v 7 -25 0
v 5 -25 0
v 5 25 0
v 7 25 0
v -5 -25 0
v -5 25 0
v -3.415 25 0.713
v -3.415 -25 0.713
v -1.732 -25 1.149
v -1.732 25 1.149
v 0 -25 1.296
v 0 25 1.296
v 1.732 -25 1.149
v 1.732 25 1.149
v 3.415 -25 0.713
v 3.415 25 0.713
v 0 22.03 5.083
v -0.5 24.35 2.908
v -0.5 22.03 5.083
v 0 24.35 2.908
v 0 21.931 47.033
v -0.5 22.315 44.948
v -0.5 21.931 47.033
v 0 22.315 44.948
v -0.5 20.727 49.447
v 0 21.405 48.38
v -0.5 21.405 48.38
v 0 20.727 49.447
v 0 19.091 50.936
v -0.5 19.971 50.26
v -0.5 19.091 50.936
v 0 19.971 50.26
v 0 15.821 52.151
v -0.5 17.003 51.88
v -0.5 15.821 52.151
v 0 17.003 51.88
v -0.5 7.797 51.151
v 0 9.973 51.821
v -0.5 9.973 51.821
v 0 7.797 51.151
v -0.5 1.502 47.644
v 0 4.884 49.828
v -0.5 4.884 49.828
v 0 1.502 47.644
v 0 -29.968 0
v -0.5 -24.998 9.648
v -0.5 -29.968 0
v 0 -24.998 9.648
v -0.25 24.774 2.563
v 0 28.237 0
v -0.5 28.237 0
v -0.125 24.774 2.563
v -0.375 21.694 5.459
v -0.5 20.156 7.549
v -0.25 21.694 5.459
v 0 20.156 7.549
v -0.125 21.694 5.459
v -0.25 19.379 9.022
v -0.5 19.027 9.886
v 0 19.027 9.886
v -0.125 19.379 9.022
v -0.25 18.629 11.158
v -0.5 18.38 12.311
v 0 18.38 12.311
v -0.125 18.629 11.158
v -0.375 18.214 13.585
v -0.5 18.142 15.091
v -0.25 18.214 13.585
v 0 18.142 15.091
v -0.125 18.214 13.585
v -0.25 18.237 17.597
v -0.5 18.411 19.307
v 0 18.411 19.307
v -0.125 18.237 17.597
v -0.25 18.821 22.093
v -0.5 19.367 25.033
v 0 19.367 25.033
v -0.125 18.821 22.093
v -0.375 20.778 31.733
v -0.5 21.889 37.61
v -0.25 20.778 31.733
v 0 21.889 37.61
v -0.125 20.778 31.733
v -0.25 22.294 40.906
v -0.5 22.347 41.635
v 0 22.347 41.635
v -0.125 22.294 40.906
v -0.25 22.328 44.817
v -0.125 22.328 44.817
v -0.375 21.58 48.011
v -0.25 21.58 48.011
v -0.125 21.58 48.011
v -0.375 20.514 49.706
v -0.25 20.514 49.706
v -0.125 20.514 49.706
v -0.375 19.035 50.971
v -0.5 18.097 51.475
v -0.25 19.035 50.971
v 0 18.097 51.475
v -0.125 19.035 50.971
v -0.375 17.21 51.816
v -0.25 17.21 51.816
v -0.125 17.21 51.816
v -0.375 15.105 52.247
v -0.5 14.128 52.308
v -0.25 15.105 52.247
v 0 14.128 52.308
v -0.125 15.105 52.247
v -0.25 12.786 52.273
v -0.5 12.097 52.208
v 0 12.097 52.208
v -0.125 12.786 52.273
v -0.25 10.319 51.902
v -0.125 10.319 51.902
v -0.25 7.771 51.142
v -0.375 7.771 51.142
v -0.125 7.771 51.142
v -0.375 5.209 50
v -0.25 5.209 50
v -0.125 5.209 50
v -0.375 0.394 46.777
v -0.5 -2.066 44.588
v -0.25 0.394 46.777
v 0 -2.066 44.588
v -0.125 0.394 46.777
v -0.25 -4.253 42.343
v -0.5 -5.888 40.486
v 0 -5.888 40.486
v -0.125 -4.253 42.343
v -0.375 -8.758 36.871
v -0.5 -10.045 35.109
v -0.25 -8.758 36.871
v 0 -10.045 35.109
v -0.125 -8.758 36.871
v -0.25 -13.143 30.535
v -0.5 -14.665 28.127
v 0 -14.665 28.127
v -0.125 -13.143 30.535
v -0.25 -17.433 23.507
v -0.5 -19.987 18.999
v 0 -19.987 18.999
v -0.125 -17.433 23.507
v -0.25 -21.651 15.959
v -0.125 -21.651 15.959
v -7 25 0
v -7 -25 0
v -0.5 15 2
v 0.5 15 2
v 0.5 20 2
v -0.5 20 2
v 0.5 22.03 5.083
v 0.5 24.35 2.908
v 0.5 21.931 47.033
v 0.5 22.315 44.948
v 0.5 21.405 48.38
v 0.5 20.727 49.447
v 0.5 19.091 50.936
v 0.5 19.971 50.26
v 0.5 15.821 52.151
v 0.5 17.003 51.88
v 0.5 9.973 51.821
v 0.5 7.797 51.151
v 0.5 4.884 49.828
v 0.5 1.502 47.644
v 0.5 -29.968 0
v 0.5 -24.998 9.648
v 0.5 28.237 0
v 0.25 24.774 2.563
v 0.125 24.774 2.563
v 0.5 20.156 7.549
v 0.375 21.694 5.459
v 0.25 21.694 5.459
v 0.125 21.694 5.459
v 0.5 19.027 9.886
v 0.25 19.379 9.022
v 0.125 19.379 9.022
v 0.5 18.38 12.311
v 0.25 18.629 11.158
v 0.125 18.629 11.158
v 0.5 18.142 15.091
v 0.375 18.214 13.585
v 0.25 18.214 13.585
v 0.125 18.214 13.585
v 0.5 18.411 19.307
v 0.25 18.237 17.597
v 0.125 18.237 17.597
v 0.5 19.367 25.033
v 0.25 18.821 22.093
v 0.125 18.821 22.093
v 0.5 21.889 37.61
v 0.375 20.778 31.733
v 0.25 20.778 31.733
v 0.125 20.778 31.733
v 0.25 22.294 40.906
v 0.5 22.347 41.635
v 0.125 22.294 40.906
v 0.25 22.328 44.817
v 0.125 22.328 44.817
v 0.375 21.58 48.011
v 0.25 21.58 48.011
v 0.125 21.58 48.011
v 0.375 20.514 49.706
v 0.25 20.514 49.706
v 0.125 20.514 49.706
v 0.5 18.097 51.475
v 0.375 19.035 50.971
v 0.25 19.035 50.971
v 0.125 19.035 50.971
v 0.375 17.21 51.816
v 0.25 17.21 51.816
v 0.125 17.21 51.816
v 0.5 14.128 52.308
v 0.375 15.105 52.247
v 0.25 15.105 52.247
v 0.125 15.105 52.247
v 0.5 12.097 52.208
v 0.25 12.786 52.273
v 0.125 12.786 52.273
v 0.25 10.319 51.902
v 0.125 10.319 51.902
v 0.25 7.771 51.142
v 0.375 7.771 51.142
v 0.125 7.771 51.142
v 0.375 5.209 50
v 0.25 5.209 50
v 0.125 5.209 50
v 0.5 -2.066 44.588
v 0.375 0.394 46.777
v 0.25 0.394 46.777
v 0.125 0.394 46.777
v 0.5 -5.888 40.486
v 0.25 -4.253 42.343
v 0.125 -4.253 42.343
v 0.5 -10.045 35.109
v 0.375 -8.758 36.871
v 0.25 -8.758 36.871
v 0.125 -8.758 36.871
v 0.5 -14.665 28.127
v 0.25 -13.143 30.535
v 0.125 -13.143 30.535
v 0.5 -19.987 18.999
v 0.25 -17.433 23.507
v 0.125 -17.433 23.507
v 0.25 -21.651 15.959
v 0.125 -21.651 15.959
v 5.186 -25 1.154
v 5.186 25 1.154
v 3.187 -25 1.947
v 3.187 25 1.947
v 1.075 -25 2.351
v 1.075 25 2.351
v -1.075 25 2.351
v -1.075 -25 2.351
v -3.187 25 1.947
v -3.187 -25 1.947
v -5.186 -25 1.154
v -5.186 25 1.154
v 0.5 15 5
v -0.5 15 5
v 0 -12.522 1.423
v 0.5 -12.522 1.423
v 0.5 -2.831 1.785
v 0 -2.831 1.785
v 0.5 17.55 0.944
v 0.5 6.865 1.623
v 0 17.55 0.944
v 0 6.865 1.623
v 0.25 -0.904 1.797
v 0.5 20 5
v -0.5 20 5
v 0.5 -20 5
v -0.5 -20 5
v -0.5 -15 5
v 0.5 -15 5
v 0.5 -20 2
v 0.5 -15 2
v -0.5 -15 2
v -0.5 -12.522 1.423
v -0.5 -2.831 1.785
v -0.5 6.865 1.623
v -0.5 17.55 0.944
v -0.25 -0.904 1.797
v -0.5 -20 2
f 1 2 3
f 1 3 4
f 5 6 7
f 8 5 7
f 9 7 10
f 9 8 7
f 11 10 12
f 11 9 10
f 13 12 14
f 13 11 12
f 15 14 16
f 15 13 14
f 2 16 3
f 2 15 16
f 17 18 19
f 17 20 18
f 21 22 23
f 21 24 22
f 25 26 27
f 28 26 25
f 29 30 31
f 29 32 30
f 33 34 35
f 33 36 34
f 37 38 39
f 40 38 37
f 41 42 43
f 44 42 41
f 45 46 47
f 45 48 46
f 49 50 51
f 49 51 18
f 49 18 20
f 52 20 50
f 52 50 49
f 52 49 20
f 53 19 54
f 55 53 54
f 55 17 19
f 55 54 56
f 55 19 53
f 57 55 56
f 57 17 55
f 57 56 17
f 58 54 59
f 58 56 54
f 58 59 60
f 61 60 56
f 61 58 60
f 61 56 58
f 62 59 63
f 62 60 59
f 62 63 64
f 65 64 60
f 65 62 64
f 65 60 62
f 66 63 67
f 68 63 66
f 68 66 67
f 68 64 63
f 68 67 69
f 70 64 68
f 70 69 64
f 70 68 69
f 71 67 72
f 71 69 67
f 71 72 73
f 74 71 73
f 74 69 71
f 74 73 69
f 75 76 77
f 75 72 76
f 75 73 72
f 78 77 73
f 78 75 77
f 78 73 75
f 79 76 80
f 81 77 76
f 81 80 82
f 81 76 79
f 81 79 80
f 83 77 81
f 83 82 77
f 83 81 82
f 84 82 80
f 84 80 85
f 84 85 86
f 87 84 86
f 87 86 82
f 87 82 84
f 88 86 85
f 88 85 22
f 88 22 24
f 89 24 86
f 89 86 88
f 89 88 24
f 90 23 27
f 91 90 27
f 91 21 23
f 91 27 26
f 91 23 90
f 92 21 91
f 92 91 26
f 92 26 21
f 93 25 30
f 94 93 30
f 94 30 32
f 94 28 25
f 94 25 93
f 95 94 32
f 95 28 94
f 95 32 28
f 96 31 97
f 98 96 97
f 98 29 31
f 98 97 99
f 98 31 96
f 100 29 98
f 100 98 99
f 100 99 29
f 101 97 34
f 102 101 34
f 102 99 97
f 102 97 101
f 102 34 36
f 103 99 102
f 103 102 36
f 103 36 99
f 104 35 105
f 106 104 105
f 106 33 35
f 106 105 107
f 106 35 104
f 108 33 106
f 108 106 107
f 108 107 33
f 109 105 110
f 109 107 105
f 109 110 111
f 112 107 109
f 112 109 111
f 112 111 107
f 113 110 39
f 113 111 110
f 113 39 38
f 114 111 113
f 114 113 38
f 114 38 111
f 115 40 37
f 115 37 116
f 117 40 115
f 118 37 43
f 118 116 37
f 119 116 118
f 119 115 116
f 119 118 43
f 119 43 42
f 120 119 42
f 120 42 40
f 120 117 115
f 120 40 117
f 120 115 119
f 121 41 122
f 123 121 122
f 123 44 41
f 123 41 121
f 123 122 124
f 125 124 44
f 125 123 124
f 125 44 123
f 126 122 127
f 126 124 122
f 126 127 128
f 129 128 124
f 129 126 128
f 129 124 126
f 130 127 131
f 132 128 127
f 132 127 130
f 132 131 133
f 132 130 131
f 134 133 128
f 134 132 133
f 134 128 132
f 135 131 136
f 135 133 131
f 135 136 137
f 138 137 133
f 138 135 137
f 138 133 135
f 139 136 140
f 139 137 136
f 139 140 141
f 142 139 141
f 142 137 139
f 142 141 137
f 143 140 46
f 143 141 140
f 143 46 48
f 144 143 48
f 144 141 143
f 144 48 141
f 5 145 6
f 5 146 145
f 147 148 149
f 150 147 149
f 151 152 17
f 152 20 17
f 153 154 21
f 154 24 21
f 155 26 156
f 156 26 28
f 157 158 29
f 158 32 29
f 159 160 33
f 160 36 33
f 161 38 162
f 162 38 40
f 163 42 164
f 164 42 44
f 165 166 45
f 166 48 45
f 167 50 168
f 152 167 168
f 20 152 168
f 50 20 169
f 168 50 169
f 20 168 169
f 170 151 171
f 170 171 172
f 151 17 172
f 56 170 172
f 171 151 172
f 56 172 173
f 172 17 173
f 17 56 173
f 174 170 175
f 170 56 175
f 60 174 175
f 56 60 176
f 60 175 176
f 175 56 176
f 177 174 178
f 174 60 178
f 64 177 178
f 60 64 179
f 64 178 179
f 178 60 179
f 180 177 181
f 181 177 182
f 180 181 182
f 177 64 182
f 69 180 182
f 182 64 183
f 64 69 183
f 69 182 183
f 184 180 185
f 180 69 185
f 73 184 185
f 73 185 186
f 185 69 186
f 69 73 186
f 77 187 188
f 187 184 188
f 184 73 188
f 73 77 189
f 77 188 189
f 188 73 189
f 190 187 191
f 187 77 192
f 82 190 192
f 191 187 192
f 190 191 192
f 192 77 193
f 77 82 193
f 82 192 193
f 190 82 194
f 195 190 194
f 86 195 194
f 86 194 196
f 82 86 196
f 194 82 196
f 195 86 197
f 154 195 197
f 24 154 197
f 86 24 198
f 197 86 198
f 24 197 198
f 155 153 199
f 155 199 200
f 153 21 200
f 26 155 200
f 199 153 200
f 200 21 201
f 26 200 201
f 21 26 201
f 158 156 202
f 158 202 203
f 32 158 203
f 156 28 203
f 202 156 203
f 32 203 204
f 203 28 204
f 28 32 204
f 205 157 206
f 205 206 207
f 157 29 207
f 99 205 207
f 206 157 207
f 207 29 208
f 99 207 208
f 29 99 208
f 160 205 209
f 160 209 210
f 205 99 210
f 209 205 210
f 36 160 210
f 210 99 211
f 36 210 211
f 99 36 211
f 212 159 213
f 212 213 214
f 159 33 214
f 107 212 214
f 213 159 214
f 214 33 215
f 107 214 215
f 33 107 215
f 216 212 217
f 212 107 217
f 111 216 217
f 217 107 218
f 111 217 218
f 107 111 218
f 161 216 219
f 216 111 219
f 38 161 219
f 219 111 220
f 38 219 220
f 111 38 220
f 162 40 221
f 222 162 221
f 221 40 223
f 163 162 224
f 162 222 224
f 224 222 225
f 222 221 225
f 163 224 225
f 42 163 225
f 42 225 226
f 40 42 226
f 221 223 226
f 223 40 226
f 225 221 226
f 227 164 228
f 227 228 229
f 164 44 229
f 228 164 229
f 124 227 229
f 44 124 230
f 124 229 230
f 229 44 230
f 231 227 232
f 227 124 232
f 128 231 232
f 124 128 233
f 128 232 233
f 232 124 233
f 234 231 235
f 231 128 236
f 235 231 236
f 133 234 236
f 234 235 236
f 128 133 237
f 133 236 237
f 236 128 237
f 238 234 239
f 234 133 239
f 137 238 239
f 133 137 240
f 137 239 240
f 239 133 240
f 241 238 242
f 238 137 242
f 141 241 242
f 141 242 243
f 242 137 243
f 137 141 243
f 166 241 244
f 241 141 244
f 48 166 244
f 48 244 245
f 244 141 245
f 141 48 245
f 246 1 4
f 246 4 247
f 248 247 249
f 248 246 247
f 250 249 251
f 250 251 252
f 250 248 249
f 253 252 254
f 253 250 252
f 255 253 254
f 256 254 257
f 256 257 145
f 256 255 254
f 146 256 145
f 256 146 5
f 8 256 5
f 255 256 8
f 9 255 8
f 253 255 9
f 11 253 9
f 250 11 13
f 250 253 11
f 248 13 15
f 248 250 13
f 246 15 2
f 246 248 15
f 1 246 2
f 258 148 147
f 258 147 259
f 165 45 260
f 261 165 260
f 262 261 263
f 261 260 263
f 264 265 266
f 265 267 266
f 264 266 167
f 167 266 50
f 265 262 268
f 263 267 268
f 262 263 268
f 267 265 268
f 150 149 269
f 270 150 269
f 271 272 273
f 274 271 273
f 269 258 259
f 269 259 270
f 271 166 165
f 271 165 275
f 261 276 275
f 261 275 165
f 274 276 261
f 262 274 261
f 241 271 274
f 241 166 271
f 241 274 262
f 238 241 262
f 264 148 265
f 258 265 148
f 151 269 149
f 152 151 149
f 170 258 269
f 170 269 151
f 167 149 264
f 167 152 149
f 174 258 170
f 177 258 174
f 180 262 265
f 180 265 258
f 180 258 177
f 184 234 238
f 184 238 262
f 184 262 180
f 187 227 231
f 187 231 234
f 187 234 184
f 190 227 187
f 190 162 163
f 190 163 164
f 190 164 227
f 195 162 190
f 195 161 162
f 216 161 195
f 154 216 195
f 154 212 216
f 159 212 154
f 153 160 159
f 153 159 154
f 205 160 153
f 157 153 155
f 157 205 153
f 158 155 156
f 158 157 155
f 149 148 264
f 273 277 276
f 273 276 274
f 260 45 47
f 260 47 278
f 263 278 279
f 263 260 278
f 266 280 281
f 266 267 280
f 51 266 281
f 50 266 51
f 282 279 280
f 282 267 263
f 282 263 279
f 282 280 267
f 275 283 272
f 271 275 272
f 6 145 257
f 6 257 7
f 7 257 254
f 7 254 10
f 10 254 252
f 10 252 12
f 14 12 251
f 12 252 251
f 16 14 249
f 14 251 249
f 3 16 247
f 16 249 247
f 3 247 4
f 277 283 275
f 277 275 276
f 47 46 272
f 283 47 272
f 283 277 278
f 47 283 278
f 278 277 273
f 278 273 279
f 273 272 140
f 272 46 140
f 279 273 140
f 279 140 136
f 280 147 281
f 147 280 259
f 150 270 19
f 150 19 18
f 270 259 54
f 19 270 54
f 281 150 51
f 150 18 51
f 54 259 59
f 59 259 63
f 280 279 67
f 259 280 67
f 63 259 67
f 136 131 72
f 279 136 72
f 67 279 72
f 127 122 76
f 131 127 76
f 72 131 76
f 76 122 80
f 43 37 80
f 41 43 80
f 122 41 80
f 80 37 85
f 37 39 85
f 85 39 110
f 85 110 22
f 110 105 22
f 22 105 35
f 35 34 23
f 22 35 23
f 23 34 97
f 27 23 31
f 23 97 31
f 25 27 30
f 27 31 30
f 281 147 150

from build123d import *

# Parameters (mm, degrees)
F2_DEPTH = 25
F3_DEPTH = 0.5
F4_W     = 5
F4_H     = 3
F5_DEPTH = 1


with BuildPart() as f2:
    # F0 (on Front) → F2 (new body, symmetric)
    with BuildSketch(Plane.XZ):
        with BuildLine():
            ThreePointArc((-5, 0), (0, 1.295630141), (5, 0))
            Line((5, 0), (7, 0))
            ThreePointArc((7, 0), (0, 2.401754251), (-7, 0))
            Line((-7, 0), (-5, 0))
        make_face()
    extrude(amount=F2_DEPTH, both=True)


with BuildPart() as f3:
    # F1 (on Right) → F3 (new body, symmetric)
    with BuildSketch(Plane.YZ):
        with BuildLine():
            add(Edge.make_bspline(
                [(-29.968450375, 0), (-20.2834898441, 0.8980619755), (-0.9008219888, 2.6953679045), (18.52041614, 0.8988497881), (28.2374212838, 0)],
                knots=[0, 0, 0, 0, 0.4996711806, 1, 1, 1, 1], degree=3))
            add(Edge.make_bspline(
                [(28.2374212838, 0), (23.5346273127, 3.3426593215), (12.1004134849, 11.4698878734), (29.9820999442, 52.4786254251), (-2.1355902035, 54.384946251), (-18.9209685078, 21.5865959824), (-29.968450375, 0)],
                knots=[0, 0, 0, 0, 0.1878770554, 0.456797903, 0.6424855486, 1, 1, 1, 1], degree=3))
        make_face()
    extrude(amount=F3_DEPTH, both=True)

    # F4 (on Right) → F5 (cut, symmetric)
    with BuildSketch(Plane.YZ):
        with Locations((-17.5, 3.5)):
            Rectangle(F4_W, F4_H)
        with Locations((17.5, 3.5)):
            Rectangle(F4_W, F4_H)
    extrude(amount=F5_DEPTH, both=True, mode=Mode.SUBTRACT)


solid = Compound([f2.part, f3.part])
